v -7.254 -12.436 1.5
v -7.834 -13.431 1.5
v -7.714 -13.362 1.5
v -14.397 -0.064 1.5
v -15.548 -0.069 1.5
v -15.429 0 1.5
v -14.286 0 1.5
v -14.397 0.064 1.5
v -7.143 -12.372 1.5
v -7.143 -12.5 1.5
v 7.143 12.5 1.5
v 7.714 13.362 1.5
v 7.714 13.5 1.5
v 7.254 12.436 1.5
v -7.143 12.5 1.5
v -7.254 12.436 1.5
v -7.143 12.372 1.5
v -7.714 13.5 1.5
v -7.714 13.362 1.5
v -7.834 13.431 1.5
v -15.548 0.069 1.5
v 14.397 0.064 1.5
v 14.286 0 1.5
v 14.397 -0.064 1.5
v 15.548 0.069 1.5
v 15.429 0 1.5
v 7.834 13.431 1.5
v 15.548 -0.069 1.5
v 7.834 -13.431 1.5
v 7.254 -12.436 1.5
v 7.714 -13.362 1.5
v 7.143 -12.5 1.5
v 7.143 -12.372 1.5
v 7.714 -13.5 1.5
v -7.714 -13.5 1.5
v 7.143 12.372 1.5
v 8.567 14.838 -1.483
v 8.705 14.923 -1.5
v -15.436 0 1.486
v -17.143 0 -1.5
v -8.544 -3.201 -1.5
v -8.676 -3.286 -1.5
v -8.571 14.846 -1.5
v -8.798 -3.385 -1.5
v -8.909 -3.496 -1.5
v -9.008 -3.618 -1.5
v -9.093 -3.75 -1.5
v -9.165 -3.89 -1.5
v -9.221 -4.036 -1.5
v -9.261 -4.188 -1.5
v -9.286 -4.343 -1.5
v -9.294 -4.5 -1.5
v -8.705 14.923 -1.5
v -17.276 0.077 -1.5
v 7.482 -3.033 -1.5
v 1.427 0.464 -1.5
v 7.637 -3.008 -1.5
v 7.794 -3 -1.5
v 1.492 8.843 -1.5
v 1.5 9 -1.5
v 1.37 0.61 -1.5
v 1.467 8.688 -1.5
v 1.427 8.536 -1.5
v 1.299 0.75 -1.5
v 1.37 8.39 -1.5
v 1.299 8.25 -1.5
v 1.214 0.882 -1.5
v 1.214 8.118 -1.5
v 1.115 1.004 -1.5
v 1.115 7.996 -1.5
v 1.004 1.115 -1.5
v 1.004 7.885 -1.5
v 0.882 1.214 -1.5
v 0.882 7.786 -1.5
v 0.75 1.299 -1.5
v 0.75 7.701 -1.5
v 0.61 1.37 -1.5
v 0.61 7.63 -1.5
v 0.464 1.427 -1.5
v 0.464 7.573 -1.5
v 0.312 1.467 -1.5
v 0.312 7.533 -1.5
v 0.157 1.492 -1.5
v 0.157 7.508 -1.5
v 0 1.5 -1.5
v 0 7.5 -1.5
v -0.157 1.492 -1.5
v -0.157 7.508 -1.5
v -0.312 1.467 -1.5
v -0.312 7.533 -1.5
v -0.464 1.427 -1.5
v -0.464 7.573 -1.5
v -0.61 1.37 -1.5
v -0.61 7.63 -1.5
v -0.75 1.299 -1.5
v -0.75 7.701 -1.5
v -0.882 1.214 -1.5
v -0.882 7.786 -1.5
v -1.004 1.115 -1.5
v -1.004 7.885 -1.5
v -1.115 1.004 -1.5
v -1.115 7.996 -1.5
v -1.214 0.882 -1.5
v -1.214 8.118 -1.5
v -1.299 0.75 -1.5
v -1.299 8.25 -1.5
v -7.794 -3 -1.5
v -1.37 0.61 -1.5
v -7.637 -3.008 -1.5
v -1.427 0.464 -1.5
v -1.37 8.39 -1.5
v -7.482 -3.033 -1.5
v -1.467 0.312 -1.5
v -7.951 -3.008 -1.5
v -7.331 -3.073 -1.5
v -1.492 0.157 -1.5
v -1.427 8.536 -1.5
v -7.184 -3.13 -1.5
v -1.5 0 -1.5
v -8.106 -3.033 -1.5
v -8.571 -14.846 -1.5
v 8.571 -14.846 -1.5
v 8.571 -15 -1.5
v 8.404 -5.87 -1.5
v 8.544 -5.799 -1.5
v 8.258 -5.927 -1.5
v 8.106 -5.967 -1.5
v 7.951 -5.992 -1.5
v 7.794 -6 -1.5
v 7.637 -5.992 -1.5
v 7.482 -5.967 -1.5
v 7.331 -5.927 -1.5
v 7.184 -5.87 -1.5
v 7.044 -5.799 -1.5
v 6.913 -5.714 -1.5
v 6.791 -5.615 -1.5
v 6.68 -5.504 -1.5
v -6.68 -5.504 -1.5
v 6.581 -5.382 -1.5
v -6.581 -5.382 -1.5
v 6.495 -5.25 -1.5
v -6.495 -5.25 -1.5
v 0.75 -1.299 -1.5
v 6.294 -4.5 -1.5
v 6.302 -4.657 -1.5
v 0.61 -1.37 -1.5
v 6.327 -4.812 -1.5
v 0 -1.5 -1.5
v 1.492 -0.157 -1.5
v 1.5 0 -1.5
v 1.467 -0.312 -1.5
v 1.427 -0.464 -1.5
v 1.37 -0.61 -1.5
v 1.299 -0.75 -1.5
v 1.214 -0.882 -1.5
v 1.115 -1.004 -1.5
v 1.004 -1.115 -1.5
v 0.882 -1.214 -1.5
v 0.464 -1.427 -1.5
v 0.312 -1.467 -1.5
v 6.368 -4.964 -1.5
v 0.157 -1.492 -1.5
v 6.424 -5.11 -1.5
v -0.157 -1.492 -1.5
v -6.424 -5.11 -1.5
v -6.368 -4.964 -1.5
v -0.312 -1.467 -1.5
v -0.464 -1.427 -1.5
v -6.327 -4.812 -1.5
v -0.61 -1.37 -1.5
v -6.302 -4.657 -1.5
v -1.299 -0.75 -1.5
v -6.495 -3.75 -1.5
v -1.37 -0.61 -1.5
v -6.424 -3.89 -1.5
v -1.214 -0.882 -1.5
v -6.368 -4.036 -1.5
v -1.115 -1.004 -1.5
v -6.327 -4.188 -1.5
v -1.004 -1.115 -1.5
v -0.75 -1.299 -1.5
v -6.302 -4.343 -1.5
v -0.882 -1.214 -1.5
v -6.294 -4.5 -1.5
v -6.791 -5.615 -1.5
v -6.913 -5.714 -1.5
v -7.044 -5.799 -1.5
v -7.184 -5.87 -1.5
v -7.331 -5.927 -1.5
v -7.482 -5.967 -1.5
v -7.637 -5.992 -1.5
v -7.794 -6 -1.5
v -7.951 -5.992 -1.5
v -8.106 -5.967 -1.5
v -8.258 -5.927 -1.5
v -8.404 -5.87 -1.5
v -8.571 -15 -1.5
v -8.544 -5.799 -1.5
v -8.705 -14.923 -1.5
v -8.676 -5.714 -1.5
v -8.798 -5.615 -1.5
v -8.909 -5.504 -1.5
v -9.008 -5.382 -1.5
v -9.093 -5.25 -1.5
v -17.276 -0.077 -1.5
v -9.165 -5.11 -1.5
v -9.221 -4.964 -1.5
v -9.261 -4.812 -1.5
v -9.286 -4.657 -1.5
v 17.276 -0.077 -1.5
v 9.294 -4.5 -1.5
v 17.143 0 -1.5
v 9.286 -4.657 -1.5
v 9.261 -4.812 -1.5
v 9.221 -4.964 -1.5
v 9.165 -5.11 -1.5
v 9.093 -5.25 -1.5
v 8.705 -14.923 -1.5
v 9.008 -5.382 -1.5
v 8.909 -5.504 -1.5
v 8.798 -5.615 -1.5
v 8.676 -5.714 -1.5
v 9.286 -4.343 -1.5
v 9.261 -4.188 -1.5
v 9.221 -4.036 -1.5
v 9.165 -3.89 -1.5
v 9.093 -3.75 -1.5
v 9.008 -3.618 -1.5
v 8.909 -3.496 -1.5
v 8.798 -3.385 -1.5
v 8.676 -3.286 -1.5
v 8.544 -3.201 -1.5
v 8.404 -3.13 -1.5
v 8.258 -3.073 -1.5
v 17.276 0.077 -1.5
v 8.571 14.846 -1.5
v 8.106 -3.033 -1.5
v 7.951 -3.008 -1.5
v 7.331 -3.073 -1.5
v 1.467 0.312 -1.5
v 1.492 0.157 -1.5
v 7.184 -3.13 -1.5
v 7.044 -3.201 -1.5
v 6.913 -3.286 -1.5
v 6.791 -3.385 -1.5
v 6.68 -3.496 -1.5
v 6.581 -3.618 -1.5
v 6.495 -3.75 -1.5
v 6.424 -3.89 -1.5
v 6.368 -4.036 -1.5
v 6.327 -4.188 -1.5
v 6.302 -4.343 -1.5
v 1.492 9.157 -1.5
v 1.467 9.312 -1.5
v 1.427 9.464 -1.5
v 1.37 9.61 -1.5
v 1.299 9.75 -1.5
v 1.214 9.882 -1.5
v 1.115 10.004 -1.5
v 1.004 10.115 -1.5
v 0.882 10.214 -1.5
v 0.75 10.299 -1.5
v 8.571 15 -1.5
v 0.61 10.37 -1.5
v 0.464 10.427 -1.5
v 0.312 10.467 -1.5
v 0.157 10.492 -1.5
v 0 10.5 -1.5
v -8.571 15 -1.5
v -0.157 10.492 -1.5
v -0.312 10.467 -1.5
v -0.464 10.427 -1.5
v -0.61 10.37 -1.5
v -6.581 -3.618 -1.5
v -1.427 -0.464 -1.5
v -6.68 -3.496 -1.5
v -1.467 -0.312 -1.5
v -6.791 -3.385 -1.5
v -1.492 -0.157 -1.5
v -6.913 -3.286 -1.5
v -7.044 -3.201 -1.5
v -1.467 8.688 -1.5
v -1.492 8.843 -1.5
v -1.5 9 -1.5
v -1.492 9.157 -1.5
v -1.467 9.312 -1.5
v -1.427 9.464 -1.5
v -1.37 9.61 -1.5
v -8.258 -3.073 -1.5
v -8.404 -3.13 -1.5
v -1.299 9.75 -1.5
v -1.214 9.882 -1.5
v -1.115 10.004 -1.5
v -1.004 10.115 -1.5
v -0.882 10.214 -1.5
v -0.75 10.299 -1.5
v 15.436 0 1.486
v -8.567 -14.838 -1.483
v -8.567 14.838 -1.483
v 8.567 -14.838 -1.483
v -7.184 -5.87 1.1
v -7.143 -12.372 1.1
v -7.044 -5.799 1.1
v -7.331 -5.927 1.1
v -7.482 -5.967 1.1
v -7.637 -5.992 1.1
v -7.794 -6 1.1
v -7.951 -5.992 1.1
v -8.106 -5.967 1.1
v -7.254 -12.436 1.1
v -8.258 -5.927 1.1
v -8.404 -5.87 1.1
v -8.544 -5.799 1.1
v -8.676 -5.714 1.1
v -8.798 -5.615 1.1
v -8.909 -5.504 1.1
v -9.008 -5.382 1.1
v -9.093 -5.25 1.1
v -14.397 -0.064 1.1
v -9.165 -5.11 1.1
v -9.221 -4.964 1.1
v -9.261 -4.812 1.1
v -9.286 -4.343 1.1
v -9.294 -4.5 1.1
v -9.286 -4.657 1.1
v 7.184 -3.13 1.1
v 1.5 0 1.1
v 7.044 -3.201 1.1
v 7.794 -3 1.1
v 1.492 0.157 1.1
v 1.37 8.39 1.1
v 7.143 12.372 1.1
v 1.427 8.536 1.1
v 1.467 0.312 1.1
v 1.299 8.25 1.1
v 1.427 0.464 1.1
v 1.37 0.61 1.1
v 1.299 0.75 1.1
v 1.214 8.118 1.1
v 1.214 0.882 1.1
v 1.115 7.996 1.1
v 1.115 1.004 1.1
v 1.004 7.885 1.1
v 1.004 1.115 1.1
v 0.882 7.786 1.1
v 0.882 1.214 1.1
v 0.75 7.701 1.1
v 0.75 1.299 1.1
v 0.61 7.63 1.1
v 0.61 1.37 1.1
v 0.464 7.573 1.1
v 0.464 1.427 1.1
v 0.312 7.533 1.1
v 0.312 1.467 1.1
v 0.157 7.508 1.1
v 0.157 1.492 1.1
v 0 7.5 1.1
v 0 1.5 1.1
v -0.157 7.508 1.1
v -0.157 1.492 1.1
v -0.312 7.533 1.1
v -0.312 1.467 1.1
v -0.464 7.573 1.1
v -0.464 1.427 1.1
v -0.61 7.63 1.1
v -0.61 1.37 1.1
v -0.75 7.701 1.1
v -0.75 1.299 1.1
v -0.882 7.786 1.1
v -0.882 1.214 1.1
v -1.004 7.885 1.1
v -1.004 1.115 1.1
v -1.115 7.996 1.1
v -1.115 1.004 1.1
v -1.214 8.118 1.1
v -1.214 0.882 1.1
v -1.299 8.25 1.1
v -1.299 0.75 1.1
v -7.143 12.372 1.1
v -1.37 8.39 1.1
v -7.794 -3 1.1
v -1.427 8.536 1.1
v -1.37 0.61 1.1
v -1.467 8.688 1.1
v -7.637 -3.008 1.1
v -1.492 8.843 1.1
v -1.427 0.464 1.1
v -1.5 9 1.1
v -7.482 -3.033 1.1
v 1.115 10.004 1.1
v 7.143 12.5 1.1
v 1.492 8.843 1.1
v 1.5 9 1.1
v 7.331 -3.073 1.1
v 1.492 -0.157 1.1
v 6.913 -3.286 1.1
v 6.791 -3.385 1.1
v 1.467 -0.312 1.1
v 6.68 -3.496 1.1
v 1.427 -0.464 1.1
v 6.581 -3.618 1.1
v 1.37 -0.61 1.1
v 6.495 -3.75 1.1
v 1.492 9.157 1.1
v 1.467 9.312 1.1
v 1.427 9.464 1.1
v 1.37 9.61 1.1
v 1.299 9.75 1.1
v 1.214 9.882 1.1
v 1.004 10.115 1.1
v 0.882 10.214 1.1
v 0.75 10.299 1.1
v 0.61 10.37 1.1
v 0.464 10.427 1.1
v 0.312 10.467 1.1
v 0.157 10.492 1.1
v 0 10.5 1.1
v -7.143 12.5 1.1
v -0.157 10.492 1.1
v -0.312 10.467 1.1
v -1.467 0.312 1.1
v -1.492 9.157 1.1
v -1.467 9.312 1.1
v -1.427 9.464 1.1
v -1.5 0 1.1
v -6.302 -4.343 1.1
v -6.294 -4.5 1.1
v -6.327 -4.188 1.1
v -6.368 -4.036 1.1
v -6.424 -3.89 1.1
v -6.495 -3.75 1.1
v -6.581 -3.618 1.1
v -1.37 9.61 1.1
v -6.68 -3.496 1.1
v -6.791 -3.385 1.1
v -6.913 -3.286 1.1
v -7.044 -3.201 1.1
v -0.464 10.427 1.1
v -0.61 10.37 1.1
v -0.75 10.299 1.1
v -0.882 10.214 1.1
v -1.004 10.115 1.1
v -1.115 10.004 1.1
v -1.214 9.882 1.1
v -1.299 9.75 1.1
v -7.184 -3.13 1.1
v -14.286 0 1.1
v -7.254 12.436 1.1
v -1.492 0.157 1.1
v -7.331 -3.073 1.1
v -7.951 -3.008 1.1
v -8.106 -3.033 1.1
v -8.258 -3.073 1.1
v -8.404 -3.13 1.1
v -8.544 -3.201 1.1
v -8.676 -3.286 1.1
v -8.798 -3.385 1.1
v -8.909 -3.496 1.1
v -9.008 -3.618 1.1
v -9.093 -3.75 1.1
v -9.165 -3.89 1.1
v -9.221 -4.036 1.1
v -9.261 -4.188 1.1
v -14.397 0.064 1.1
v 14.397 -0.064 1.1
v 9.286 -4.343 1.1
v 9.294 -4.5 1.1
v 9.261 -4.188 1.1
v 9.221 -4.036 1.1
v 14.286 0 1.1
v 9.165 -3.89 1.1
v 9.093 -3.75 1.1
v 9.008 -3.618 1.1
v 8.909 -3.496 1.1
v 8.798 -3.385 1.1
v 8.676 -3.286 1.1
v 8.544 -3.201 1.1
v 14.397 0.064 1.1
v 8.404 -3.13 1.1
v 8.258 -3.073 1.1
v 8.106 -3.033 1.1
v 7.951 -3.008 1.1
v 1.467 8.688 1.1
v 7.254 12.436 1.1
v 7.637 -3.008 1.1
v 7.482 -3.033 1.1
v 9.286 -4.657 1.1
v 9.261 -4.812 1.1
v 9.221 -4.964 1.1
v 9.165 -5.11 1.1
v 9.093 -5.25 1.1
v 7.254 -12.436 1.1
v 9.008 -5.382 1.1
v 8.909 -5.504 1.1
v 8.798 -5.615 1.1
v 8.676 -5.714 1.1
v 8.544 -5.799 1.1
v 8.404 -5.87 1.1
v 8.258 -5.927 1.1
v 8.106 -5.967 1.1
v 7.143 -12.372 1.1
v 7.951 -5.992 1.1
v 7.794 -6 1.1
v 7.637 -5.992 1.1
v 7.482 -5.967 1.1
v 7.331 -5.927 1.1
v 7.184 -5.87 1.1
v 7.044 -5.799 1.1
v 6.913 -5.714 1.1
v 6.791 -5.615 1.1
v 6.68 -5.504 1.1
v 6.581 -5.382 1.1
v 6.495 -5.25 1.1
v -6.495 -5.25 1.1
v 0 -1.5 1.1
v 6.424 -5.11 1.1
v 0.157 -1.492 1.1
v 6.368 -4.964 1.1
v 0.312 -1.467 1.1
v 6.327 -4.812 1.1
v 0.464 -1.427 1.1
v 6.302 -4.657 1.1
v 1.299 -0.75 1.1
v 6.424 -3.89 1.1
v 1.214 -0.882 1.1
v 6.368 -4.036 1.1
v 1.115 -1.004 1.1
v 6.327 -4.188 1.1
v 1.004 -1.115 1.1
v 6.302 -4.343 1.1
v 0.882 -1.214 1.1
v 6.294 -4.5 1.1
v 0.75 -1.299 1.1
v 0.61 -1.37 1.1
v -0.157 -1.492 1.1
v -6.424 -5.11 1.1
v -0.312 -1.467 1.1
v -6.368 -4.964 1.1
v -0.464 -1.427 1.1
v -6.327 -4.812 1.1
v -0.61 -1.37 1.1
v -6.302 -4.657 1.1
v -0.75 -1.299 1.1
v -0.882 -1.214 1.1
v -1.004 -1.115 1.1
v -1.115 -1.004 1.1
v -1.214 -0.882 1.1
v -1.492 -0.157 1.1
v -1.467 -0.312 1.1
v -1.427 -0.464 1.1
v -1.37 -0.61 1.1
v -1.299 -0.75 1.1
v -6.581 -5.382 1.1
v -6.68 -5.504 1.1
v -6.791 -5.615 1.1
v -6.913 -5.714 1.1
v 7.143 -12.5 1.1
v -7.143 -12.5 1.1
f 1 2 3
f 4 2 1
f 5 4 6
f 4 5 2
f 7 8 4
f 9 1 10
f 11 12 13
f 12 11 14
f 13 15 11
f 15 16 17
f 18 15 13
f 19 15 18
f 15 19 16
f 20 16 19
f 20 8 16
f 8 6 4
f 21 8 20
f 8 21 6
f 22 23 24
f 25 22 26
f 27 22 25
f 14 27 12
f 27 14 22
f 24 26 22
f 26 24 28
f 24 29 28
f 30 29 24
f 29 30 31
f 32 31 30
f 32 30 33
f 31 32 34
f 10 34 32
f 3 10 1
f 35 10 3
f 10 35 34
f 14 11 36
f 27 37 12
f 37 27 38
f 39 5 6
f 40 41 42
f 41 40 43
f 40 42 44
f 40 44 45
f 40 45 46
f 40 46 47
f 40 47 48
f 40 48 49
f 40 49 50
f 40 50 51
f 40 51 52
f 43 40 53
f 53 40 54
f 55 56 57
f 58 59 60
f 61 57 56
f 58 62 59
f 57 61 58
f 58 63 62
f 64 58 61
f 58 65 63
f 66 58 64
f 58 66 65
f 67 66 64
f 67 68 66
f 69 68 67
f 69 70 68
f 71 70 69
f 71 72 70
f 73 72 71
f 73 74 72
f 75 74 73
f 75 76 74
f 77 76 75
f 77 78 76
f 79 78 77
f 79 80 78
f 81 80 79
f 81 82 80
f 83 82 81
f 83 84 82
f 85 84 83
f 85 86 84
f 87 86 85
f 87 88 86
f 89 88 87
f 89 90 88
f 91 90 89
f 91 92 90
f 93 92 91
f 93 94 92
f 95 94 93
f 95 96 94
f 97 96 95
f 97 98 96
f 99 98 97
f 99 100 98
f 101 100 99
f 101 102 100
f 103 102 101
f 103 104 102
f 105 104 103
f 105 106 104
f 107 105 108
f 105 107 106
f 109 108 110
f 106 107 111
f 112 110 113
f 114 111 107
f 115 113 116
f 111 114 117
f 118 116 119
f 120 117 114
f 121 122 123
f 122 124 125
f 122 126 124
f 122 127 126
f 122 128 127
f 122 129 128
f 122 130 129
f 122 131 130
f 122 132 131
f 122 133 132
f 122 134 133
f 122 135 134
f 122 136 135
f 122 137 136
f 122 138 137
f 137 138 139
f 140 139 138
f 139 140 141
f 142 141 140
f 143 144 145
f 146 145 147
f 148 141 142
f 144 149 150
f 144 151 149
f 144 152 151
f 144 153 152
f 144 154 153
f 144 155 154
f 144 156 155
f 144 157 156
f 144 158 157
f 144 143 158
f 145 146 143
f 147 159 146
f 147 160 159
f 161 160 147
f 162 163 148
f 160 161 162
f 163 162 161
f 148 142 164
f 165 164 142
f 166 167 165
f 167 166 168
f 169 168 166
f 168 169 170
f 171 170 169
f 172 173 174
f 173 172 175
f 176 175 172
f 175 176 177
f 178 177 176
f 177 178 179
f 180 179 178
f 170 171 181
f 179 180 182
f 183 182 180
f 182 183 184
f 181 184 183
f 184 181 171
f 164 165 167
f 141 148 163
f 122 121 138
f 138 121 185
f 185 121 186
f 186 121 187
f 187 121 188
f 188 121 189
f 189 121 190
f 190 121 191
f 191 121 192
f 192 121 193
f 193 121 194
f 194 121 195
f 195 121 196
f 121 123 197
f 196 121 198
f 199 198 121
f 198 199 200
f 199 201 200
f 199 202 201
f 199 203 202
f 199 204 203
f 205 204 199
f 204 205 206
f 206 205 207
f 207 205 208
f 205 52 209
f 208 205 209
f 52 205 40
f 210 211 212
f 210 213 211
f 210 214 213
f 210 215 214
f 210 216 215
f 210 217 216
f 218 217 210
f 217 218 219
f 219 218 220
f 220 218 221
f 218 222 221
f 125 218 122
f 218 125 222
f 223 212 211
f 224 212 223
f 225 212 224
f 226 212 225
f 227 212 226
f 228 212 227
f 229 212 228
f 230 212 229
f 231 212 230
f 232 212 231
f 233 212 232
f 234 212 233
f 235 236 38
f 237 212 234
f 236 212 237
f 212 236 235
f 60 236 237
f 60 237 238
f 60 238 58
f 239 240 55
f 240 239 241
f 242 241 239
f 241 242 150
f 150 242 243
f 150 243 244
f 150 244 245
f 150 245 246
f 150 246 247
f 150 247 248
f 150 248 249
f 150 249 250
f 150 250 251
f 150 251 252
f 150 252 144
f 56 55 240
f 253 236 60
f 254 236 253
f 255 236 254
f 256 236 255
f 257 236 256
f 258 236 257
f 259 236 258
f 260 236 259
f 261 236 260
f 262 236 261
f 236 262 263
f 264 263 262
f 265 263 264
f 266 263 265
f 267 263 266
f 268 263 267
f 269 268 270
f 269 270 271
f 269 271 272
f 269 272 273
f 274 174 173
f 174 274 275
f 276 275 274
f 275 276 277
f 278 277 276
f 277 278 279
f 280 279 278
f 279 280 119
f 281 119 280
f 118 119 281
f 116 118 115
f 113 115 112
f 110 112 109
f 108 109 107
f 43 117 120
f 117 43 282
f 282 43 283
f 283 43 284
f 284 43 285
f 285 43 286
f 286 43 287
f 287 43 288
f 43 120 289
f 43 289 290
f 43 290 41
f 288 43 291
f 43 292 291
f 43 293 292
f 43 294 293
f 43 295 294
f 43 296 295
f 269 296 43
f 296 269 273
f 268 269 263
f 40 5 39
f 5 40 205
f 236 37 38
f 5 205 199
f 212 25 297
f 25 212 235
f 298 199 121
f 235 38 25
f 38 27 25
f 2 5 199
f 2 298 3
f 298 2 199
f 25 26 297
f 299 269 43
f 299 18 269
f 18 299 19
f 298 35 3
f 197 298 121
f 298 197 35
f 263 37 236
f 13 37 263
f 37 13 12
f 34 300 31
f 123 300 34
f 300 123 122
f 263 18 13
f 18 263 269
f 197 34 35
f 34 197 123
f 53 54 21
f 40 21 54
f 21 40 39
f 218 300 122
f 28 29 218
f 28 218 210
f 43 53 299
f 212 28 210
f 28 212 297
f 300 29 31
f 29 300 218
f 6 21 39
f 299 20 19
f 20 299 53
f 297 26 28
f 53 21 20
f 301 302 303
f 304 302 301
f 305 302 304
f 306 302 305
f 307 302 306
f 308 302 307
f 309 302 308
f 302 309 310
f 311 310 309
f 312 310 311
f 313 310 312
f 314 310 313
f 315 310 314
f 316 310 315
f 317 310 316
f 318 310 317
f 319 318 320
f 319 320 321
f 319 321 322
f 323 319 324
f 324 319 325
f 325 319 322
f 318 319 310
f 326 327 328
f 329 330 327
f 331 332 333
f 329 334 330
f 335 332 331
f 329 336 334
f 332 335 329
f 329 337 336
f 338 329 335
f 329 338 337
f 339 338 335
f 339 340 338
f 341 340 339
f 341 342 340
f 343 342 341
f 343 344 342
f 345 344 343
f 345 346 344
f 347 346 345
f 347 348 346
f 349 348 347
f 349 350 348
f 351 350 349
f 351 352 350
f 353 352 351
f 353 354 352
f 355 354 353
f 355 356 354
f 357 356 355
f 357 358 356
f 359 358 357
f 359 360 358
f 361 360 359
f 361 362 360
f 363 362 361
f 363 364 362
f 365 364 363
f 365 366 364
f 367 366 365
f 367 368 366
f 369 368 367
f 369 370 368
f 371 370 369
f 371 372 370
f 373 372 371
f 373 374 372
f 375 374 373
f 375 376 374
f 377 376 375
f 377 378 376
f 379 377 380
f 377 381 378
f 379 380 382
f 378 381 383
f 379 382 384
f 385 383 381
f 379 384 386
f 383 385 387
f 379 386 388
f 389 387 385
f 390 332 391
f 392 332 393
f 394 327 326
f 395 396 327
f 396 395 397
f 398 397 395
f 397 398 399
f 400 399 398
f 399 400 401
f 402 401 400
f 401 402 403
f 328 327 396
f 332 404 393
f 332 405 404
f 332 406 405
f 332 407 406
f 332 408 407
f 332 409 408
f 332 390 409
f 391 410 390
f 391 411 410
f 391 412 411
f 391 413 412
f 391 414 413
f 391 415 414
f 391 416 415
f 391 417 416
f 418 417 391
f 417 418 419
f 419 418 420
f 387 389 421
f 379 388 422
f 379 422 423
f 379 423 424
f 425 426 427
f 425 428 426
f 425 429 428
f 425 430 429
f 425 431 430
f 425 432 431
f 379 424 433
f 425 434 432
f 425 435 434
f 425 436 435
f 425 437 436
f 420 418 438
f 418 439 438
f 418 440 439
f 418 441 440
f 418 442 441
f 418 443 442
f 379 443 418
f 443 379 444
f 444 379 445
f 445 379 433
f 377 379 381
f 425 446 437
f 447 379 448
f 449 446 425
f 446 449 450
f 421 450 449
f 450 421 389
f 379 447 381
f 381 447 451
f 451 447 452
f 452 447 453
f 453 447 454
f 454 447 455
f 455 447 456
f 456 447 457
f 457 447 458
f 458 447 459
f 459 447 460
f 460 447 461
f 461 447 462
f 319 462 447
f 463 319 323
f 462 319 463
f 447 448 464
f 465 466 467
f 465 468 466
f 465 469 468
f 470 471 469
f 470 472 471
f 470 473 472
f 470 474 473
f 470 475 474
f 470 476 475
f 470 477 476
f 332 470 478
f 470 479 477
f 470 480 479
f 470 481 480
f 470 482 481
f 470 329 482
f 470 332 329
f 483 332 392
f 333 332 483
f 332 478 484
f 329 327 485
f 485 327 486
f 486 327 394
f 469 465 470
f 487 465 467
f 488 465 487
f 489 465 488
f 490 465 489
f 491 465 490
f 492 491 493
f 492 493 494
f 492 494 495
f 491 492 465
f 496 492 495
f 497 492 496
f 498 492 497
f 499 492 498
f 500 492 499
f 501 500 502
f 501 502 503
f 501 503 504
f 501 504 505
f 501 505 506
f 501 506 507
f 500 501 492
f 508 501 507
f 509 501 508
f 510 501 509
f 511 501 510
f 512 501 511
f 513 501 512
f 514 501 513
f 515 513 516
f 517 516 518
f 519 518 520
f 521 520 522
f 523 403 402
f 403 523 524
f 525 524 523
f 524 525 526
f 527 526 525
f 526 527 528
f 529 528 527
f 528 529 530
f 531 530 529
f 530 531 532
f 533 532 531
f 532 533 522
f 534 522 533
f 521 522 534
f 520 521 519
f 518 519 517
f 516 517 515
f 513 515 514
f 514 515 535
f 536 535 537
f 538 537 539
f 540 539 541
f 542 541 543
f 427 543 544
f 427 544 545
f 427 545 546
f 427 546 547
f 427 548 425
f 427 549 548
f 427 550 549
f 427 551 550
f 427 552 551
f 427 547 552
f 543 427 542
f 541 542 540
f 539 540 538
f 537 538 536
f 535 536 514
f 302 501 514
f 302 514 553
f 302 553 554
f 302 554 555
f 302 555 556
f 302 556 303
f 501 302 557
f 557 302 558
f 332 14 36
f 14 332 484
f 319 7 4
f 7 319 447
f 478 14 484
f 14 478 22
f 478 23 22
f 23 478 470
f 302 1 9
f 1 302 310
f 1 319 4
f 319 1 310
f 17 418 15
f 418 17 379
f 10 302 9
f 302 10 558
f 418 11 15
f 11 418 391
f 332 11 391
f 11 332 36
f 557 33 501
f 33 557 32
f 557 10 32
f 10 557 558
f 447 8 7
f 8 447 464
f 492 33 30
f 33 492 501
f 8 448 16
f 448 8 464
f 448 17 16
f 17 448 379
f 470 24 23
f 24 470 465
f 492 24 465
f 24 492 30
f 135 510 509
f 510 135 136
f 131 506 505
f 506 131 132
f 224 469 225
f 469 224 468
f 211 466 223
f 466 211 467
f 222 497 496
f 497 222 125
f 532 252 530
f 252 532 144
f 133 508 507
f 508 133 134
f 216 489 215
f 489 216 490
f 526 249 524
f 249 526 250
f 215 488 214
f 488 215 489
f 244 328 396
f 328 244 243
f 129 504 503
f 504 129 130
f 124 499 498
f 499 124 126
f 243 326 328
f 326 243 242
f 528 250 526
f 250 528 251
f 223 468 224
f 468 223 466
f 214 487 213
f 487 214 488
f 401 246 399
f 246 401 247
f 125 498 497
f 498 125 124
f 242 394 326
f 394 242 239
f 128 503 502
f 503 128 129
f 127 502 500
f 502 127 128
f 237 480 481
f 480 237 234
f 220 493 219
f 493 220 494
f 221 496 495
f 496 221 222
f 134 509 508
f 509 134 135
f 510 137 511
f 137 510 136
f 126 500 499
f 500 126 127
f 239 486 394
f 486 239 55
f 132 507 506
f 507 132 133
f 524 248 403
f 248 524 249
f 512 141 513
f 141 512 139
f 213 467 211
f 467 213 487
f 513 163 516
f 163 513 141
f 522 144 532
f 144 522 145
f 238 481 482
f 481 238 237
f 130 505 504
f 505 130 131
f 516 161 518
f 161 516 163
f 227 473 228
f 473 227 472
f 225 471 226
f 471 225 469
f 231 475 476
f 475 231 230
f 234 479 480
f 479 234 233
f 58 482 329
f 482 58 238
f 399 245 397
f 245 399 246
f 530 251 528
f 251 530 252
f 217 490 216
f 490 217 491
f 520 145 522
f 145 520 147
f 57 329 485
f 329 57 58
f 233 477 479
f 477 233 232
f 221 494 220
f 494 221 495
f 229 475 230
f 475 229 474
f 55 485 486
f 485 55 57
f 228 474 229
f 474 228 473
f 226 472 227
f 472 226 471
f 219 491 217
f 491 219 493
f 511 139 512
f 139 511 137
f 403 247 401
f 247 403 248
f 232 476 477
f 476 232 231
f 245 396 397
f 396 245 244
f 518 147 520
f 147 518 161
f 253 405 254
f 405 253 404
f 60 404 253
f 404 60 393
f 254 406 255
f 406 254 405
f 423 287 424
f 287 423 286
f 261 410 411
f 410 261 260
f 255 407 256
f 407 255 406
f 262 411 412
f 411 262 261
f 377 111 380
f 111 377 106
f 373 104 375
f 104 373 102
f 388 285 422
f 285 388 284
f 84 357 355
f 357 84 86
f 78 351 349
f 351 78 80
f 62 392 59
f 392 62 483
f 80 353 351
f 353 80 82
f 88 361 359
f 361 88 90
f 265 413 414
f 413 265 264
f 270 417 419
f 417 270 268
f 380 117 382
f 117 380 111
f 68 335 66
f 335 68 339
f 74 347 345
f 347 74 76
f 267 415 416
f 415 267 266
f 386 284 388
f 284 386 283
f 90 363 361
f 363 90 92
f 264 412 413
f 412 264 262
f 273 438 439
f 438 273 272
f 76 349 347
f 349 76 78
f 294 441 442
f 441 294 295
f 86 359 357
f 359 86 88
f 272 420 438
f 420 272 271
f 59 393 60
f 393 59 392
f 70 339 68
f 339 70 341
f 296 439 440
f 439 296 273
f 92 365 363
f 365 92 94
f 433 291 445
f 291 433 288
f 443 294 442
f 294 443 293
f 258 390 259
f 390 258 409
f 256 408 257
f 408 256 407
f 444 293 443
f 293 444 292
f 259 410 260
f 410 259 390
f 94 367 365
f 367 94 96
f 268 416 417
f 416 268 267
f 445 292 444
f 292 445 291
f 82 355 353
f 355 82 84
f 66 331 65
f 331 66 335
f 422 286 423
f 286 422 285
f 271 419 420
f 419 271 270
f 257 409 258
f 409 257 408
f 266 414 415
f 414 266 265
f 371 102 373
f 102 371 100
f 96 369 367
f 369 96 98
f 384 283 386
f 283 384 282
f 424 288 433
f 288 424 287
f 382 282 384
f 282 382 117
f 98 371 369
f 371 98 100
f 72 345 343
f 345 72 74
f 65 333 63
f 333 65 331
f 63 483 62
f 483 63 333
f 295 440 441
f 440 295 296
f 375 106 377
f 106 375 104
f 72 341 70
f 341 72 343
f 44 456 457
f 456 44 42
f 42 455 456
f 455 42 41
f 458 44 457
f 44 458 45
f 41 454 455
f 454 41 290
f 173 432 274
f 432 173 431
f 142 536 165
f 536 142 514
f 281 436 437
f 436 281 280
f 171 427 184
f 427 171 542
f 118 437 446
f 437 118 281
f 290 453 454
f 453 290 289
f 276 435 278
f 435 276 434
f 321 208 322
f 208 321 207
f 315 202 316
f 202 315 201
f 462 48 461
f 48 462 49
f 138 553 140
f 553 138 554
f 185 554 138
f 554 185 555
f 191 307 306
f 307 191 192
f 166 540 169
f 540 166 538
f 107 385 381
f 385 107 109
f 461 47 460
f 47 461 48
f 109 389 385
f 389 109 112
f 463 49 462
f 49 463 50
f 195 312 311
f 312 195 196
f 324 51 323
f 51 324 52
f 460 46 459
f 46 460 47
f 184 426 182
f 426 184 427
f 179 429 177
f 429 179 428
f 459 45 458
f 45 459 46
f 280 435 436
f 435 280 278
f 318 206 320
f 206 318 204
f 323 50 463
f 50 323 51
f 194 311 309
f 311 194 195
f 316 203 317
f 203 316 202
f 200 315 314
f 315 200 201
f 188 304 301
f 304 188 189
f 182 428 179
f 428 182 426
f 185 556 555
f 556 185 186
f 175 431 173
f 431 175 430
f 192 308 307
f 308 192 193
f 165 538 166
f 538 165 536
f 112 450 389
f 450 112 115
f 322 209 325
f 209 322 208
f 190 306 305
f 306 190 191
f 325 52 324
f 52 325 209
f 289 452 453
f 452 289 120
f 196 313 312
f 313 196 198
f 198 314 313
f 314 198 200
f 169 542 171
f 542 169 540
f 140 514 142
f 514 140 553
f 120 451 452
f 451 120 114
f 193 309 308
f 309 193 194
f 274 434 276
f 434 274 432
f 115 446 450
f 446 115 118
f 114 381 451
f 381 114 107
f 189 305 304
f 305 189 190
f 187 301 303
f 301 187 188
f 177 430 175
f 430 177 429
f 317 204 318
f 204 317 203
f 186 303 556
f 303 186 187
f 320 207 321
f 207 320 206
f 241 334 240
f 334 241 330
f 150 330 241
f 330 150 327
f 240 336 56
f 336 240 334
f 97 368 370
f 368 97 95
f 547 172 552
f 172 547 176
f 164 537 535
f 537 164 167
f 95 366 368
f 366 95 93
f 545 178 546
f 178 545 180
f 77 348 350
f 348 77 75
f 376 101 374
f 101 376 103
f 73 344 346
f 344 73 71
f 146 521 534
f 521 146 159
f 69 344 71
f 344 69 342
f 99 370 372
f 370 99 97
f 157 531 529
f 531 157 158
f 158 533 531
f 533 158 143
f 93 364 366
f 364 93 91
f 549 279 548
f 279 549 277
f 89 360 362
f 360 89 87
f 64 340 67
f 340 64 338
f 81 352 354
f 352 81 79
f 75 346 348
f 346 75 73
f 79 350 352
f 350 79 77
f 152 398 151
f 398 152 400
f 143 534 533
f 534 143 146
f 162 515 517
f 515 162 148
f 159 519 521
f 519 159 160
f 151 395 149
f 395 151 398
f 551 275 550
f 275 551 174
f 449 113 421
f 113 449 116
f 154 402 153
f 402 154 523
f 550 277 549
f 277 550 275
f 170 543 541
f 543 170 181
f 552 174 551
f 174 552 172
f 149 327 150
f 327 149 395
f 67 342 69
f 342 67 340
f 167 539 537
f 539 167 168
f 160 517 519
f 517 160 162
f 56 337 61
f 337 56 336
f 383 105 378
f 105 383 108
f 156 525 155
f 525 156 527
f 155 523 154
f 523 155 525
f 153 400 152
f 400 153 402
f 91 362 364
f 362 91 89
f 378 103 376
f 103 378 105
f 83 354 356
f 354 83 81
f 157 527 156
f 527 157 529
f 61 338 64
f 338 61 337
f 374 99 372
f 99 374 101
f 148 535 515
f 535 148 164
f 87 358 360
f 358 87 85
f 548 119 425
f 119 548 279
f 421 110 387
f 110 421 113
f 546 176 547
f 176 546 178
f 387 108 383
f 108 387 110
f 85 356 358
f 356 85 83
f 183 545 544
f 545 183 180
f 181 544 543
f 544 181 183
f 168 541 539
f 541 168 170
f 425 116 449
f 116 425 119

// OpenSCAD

$fn=60 * 1;

// Outer hex width 
_hexOuterWidth = 30;

// Inner hex width
_hexInnerWidth = 25;

// The hex height
_hexHeight = 3;

// The depth of the inset
_hexInnerDepth = 0.5;

// The slope of the hex sides
_hexOuterSlope = 0.9;

// Adds curves to the corners
_hexOuterAngleRadius = 0;

// The radius of the magent whole in the center (0 to disable)
_hexMagRadCenter = 1.5;

// The depth of the magnet hole (0 will cut through)
_hexMagDepth = 0;

// The radius of the magent whole(s) along the edge  (0 to disable)
_hexMagRadEdge = 1.5;

// How far are the magnets positioned from center.
_hexMagEdgeDistance = 9;

// Align the magnets with the corners or the edges
_hexMagPos = "Edge";   //[Edge,Corner]

// Put a magnet at every interval or every other (6 magnets for all, 3 for every other)
_hexMagFreq  = "EveryOther";  //[EveryOther,All]

// Hidden variables
//_hexInnerWidth = _hexOuterWidth * 0.85;   // multiplier ... 40=34, 20=17
//_hexMagEdgeDistance = (_hexInnerWidth/3);
_hexMagEdgeDistance2 = (_hexInnerWidth/2)-_hexMagRadEdge-0.1;           // distance #2 is tricky .... logic in loop
//_hexMagEdgeDistance2 = 0;


_rotHalf1 = []; _rotHalf2 = [];

_rotHalf1 = (_hexMagPos == "Edge" && _hexMagFreq=="All" ? [-120, -60, 0, 60, 120, 180]
    : (_hexMagPos == "Edge" && _hexMagFreq=="EveryOther" ? [-120, 0, 120]        
        : (_hexMagPos == "Corner" && _hexMagFreq=="EveryOther" ? [-150, 90, -30]
            : (_hexMagPos == "Corner" && _hexMagFreq=="All" ? [-150, -90, -30, 30, 90, 150]
                : [])
            )
        )    
    );
    

hexagonBase(
    _hexHeight, _hexOuterWidth, _hexOuterSlope, _hexOuterAngleRadius, 
    _hexInnerWidth, _hexInnerDepth, 
    _hexMagRadCenter, _hexMagRadEdge, _hexMagEdgeDistance, _hexMagEdgeDistance2, 
    _rotHalf1, _rotHalf2);




module hexagonBase(hexHeight, hexOuterWidth, hexOuterSlope, hexOuterAngleRadius, 
    hexInnerWidth, hexInnerDepth,
    hexMagRadCenter, hexMagRadEdge, hexMagEdgeDistance, hexMagEdgeDistance2, rotHalf1, rotHalf2) {
        
    depth = (hexOuterAngleRadius != 0 ? hexHeight - hexInnerDepth - 0.4 : hexHeight - hexInnerDepth + 0.1);
                        
    difference() 
    {
        // the part to add
        union(){
            hexagon(hexOuterWidth,hexHeight,hexOuterAngleRadius,hexOuterSlope);
            //hexagonSimple(40,4);
        }
      
        // the part to remove
        union(){
            // remove inner hex
            if(hexOuterAngleRadius != 0) {                
                //depth = hexHeight - hexInnerDepth - 0.4;    // -0.4 offset ... dunno
                if(depth <= 0) {
                    translate([0, 0, -1]) hexagonSimple(hexInnerWidth,hexHeight+3);
                } else {
                    translate([0, 0, depth]) hexagonSimple(hexInnerWidth,hexHeight);
                }
                
            } else {
                //depth = hexHeight - hexInnerDepth + 0.1;
                if(depth <= 0) {
                    translate([0, 0, -1]) hexagonSimple(hexInnerWidth,hexHeight+3);
                } else {
                    translate([0, 0, depth]) hexagonSimple(hexInnerWidth,hexHeight);
                }
            }
            
            if(depth > 0) {
                // remove center magnet hole
                if(hexMagRadCenter != 0) {
                    if(_hexMagDepth == 0) {
                        #cylinder(r=hexMagRadCenter,h=hexHeight+2,center=true);      // # will show the "ghost shape"
                    } else {
                        //translate([0, 0, _hexHeight-_hexMagDepth])
                        //    #cylinder(r=hexMagRadCenter,h=hexHeight+_hexMagDepth,center=true);      // # will show the "ghost shape"
                        translate([0, 0, _hexHeight-_hexMagDepth])
                            #cylinder(r=hexMagRadCenter,h=hexHeight,center=true);      // # will show the "ghost shape"
                    }
                }
                
                
                if(hexMagRadEdge != 0) {
                    
                    // remove edge wholes (center of edge)
                    for (r = rotHalf1) {   
                        rotate([0,0,r])
                        //translate([0, (hexInnerWidth/2)-hexMagRadEdge-0.1, 0])    // =7 if 20, =14 if 40
                        if(_hexMagDepth == 0) {
                            translate([0, hexMagEdgeDistance, 0])
                                #cylinder(r=hexMagRadEdge,h=hexHeight+2,center=true);  // # will show the "ghost shape"
                        } else {
                            translate([0, hexMagEdgeDistance, _hexHeight-_hexMagDepth])
                                #cylinder(r=hexMagRadEdge,h=hexHeight,center=true);  // # will show the "ghost shape"
                        }
                    }
                        
                    // remove edge wholes (center of edge)
                    for (r = rotHalf2) {   
                        rotate([0,0,r])
                        
                        if(_hexMagDepth == 0) {
                            //translate([0, (hexInnerWidth/2)-hexMagRadEdge-0.1, 0])    // =7 if 20, =14 if 40
                            translate([0, hexMagEdgeDistance2, 0])
                                #cylinder(r=hexMagRadEdge,h=hexHeight+2,center=true);  // # will show the "ghost shape"
                        } else {
                            translate([0, hexMagEdgeDistance2, _hexHeight-_hexMagDepth])
                                #cylinder(r=hexMagRadEdge,h=hexHeight,center=true);  // # will show the "ghost shape"
                        }
                    }                
                }
            }
        }    
    }   
}  


module hexagonSimple(size, height) {
    
    boxWidth = size/1.75;
    for (r = [-60, 0, 60]) {  
        rotate([0,0,r]) 
        //cube([boxWidth, size, height], true);
        linear_extrude(height, scale=1, center = true) square([boxWidth,size], center = true);
    }
}
module hexagon(size, height, radius, slope) {
// Hexagon with beveled corners and sloped edges
//    NOTE: Sizing issue when roundnig corners
    
    // adjust actual size based on cylinder radius used for corner bevel
    size = size - radius*2;
    
    // set boxWidth used for hex creation
    boxWidth = size/1.75;
        
    for (r = [-60, 0, 60]) {   
        rotate([0,0,r]) 
            
        if(radius != 0) {
 
            // FIX: height
            height = height-1;        // -1 offset ... not sure why (cylinder ?)

            // FIX: looses z center
            translate([0, 0, -1])     // -1 offset ... not sure why (cylinder ?)
            
            // slope edges and bevel corners
            minkowski() {    
                linear_extrude(height, scale=slope, center = true) square([boxWidth,size], center = true);
                cylinder(r=radius, true); // not sure why this creates a non-sloped bottom segment... ?
            }
        } else {
            // slope edges
            linear_extrude(height, scale=slope, center = true) square([boxWidth,size], center = true);
        }
           
    }
}
